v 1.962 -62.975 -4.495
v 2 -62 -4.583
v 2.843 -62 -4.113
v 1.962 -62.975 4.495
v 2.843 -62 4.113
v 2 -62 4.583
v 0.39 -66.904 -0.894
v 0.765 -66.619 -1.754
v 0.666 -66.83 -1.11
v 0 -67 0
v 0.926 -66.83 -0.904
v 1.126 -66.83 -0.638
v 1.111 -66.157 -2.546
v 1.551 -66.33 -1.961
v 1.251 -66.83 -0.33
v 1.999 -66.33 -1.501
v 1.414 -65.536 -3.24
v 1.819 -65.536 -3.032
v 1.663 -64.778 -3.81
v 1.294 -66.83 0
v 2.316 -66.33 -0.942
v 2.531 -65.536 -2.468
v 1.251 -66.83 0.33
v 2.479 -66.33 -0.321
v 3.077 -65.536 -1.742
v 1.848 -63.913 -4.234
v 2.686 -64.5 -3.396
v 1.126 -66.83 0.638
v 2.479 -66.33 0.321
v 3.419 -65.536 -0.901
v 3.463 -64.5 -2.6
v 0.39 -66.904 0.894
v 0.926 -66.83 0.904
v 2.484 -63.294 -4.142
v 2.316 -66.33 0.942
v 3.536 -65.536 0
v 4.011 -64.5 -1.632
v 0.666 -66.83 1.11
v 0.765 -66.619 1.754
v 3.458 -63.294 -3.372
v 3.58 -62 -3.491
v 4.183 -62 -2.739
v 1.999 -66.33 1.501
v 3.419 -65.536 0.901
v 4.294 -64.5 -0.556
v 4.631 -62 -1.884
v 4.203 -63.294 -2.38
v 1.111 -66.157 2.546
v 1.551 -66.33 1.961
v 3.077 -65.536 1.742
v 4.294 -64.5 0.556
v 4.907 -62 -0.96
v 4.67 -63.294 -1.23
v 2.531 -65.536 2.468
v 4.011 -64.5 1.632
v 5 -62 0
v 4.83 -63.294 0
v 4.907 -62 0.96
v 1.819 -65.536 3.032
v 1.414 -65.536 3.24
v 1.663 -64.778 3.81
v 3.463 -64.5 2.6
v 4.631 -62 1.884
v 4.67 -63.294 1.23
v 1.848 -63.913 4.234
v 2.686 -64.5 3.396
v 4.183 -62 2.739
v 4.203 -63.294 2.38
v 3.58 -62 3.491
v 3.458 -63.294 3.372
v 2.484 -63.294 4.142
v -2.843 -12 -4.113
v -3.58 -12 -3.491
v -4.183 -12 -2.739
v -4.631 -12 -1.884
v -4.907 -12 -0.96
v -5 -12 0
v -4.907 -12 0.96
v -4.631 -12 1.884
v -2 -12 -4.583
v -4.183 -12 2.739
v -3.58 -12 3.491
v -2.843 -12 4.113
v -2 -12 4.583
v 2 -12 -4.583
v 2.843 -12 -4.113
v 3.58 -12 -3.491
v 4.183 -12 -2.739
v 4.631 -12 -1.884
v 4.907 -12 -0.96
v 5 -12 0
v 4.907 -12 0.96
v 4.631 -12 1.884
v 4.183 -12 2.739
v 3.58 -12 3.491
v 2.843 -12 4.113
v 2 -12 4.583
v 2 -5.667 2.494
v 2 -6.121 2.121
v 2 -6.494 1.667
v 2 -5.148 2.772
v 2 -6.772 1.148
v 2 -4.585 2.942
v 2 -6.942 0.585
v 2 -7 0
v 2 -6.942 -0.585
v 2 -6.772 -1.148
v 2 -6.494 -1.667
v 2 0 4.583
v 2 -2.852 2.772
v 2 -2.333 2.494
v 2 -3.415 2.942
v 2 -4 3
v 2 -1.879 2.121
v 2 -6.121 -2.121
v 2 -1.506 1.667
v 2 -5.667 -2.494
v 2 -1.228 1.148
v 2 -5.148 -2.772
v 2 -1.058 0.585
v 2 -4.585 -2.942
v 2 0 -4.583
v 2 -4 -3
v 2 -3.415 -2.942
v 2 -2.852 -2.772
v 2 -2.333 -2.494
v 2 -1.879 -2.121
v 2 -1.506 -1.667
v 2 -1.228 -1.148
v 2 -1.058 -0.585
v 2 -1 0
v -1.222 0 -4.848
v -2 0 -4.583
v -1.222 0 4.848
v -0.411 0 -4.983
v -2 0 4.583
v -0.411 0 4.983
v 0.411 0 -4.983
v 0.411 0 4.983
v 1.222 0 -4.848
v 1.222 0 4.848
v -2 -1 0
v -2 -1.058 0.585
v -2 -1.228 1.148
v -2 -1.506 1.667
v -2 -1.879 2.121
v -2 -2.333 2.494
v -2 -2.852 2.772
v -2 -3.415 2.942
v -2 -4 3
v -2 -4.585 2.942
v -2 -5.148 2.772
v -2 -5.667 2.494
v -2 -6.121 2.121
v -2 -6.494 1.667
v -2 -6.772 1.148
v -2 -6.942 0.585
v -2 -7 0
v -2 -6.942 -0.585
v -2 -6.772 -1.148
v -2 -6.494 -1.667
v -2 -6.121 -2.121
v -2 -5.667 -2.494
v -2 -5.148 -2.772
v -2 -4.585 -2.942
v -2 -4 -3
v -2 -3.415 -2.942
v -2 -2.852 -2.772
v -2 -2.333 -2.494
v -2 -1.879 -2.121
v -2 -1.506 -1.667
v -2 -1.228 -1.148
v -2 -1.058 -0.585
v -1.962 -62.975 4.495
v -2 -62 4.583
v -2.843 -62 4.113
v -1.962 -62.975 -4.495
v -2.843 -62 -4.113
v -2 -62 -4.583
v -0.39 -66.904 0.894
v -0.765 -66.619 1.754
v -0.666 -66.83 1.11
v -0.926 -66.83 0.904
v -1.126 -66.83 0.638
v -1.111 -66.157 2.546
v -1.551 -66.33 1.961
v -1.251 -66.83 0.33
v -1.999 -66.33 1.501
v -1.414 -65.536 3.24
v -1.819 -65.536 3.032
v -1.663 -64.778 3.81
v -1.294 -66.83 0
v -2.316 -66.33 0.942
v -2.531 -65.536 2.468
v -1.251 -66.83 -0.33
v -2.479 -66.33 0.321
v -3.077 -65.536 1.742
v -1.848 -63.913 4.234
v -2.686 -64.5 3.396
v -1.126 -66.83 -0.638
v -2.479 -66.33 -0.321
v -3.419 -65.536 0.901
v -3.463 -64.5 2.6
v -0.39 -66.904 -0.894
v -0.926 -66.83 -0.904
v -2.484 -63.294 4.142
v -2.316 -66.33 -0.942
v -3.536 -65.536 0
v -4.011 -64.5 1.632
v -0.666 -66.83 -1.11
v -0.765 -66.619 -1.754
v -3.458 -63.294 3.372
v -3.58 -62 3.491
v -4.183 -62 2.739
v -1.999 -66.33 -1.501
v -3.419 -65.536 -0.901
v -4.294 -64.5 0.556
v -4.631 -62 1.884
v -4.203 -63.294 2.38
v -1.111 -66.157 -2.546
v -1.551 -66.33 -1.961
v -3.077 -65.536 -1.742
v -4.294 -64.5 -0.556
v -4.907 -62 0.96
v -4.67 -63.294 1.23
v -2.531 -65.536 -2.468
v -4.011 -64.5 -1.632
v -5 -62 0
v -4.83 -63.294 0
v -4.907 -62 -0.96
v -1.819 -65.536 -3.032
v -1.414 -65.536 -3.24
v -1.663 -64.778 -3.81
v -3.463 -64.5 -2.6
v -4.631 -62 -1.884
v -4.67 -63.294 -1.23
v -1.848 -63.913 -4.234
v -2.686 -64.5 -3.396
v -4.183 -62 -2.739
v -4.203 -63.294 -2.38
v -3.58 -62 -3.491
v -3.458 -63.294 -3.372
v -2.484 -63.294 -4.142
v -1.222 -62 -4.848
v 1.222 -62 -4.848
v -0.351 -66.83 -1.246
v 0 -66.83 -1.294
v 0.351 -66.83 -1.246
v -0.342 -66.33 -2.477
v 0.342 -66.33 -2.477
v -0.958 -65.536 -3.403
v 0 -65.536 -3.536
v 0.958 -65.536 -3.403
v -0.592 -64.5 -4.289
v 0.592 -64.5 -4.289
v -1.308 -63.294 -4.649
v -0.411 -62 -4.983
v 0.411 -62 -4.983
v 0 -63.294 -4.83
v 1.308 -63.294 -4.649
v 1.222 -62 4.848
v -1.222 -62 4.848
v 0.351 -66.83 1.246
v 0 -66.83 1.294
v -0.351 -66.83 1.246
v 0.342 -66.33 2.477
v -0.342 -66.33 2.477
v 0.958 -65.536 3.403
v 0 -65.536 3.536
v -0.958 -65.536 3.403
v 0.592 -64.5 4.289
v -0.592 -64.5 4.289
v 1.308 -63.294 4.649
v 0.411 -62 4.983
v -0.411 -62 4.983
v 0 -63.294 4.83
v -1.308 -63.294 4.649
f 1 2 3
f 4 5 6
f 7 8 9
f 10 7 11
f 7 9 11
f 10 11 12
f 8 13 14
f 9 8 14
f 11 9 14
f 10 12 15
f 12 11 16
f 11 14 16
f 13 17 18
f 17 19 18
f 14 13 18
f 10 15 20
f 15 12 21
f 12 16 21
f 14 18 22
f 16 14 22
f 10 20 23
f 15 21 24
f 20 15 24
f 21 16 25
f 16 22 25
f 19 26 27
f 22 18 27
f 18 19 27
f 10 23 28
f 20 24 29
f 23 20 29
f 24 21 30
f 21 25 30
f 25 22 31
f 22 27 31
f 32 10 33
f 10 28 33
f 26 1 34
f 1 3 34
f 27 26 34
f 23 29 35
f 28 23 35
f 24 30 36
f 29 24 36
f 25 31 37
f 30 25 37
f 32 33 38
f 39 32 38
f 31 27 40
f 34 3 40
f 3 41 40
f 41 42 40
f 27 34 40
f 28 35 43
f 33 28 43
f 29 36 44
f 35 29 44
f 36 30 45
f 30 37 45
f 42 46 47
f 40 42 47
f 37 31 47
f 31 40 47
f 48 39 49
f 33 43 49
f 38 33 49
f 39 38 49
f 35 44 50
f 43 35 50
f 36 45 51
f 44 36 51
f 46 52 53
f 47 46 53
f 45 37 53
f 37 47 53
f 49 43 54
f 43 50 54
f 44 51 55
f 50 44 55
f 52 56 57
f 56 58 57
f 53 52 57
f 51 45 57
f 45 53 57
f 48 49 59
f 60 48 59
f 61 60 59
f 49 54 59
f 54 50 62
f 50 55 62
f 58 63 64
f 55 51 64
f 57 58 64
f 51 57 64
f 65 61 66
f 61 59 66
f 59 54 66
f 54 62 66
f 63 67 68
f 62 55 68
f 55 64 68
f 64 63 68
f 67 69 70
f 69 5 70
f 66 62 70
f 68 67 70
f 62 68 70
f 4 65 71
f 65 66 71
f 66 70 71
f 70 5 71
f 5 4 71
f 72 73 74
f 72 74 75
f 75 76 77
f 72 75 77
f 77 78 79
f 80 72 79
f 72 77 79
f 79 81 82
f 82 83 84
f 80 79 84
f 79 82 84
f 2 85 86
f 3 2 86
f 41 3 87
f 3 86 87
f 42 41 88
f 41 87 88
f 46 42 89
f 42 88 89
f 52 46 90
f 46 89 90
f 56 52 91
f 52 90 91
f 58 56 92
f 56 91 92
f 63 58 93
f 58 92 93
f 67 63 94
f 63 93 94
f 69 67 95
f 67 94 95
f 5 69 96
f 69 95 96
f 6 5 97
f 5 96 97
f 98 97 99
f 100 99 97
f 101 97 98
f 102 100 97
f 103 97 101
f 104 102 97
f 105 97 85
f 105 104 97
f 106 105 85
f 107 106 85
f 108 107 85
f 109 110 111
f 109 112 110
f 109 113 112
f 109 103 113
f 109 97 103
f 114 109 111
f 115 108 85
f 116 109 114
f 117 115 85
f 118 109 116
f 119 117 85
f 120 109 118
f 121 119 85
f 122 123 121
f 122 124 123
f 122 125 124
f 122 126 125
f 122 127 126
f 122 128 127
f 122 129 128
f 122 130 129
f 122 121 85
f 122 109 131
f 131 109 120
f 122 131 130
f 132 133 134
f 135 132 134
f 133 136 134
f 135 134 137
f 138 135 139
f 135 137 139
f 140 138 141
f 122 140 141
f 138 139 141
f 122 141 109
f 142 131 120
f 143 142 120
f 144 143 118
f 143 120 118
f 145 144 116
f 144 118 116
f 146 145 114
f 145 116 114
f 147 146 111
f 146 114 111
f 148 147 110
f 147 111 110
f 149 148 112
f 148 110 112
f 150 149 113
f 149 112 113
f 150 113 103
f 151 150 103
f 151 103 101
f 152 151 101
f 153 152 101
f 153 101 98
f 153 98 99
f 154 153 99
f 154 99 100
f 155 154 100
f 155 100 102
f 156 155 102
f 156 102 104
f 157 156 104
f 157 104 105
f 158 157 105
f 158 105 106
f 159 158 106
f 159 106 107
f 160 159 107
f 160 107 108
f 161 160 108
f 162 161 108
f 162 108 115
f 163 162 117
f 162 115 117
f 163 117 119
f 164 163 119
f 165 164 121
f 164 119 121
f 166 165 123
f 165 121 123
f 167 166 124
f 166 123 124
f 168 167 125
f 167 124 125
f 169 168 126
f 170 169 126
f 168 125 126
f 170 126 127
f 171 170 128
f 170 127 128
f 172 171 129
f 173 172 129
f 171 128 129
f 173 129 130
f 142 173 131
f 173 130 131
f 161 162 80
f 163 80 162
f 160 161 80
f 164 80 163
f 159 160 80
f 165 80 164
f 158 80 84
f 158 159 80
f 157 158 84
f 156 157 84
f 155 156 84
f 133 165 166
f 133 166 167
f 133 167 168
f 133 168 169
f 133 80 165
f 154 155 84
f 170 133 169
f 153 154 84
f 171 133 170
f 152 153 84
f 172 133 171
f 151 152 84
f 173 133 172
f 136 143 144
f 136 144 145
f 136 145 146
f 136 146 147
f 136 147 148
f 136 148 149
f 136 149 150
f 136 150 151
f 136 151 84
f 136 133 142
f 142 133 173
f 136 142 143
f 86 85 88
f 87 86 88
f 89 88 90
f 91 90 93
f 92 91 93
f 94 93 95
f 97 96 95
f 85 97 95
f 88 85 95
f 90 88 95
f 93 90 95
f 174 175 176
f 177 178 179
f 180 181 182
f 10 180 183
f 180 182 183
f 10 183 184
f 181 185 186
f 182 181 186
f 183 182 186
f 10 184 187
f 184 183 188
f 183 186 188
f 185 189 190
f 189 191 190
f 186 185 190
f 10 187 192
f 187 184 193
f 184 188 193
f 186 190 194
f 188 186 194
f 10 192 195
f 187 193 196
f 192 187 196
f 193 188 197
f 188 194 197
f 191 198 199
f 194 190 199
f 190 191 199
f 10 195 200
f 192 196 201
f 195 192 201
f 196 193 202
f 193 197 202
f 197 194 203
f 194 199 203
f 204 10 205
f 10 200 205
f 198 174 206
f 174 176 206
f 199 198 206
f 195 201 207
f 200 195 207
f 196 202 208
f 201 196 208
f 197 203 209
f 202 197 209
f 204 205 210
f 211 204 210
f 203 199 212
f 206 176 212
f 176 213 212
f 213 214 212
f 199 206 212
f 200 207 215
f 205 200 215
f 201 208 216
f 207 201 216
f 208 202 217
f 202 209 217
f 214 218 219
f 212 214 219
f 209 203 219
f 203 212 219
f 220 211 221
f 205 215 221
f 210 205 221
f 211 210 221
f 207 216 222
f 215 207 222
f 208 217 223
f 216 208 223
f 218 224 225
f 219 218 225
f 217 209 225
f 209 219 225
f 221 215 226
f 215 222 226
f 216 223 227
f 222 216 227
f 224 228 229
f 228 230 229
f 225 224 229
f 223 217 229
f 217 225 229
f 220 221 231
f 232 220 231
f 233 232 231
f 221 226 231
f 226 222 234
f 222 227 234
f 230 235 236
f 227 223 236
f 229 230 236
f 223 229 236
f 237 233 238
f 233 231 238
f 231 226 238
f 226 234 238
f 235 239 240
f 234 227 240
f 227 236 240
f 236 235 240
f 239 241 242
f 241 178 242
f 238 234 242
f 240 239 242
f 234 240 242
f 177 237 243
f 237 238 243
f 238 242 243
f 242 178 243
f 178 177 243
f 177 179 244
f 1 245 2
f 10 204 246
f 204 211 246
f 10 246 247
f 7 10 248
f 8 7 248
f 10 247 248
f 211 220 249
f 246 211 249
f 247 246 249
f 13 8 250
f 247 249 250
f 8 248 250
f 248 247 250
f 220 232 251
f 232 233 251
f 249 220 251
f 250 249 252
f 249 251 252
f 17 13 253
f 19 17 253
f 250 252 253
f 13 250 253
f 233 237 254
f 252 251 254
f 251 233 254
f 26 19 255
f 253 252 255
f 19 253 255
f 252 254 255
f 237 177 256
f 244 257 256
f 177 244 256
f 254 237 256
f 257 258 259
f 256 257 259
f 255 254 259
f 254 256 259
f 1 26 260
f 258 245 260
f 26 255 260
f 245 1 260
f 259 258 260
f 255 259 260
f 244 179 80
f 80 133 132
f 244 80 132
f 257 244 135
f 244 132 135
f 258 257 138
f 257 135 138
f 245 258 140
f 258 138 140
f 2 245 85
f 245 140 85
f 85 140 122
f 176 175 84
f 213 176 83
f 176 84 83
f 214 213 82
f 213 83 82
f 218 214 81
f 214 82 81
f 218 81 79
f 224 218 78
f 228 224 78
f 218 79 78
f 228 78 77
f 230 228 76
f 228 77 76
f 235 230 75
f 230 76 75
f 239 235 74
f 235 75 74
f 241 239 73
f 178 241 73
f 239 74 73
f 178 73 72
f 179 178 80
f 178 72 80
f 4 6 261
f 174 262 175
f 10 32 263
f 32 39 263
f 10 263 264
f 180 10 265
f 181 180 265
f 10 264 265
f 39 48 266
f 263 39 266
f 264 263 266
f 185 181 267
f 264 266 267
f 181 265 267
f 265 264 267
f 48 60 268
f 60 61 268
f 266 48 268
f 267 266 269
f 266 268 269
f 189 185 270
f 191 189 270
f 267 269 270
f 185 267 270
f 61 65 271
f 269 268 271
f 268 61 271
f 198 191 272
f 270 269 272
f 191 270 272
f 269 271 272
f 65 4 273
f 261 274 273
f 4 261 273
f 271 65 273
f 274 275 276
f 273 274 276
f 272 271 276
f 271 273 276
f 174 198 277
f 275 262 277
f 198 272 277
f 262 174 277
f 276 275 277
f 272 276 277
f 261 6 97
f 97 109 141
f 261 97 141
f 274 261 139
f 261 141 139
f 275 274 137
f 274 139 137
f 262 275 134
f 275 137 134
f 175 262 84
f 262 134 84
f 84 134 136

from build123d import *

# Parameters (mm, degrees)
F2_DEPTH = 67
F3_DEPTH = 12
F4_R     = 3
F5_DEPTH = 25
F6_R     = 5


with BuildPart() as f2:
    # F1 (on Front) → F2 (new body)
    with BuildSketch(Plane.XZ):
        with BuildLine():
            ThreePointArc((2, -4.582575695), (4.1833001327, -2.7386127875), (5, 0))
            ThreePointArc((5, 0), (4.1833001327, 2.7386127875), (2, 4.582575695))
            Line((2, 4.582575695), (2, -4.582575695))
        make_face()
        with BuildLine():
            Line((2, -4.582575695), (2, 4.582575695))
            ThreePointArc((2, 4.582575695), (0, 5), (-2, 4.582575695))
            Line((-2, 4.582575695), (-2, -4.582575695))
            ThreePointArc((-2, -4.582575695), (0, -5), (2, -4.582575695))
        make_face()
        with BuildLine():
            Line((-2, -4.582575695), (-2, 4.582575695))
            ThreePointArc((-2, 4.582575695), (-5, 0), (-2, -4.582575695))
        make_face()
    extrude(amount=F2_DEPTH)

    # F1 (on Front) → F3 (cut)
    with BuildSketch(Plane.XZ):
        with BuildLine():
            Line((-2, -4.582575695), (-2, 4.582575695))
            ThreePointArc((-2, 4.582575695), (-5, 0), (-2, -4.582575695))
        make_face()
        with BuildLine():
            ThreePointArc((2, -4.582575695), (4.1833001327, -2.7386127875), (5, 0))
            ThreePointArc((5, 0), (4.1833001327, 2.7386127875), (2, 4.582575695))
            Line((2, 4.582575695), (2, -4.582575695))
        make_face()
    extrude(amount=F3_DEPTH, mode=Mode.SUBTRACT)

    # F4 (on face) → F5 (cut)
    with BuildSketch(Plane.YZ.offset(2)):
        with Locations((-4, 0)):
            Circle(F4_R)
    extrude(amount=-F5_DEPTH, mode=Mode.SUBTRACT)

    # F6
    f6_edges = [f2.edges().sort_by_distance(p)[0] for p in [
        (2, -67, -4.582576),
    ]]
    fillet(f6_edges, radius=F6_R)


solid = f2.part
